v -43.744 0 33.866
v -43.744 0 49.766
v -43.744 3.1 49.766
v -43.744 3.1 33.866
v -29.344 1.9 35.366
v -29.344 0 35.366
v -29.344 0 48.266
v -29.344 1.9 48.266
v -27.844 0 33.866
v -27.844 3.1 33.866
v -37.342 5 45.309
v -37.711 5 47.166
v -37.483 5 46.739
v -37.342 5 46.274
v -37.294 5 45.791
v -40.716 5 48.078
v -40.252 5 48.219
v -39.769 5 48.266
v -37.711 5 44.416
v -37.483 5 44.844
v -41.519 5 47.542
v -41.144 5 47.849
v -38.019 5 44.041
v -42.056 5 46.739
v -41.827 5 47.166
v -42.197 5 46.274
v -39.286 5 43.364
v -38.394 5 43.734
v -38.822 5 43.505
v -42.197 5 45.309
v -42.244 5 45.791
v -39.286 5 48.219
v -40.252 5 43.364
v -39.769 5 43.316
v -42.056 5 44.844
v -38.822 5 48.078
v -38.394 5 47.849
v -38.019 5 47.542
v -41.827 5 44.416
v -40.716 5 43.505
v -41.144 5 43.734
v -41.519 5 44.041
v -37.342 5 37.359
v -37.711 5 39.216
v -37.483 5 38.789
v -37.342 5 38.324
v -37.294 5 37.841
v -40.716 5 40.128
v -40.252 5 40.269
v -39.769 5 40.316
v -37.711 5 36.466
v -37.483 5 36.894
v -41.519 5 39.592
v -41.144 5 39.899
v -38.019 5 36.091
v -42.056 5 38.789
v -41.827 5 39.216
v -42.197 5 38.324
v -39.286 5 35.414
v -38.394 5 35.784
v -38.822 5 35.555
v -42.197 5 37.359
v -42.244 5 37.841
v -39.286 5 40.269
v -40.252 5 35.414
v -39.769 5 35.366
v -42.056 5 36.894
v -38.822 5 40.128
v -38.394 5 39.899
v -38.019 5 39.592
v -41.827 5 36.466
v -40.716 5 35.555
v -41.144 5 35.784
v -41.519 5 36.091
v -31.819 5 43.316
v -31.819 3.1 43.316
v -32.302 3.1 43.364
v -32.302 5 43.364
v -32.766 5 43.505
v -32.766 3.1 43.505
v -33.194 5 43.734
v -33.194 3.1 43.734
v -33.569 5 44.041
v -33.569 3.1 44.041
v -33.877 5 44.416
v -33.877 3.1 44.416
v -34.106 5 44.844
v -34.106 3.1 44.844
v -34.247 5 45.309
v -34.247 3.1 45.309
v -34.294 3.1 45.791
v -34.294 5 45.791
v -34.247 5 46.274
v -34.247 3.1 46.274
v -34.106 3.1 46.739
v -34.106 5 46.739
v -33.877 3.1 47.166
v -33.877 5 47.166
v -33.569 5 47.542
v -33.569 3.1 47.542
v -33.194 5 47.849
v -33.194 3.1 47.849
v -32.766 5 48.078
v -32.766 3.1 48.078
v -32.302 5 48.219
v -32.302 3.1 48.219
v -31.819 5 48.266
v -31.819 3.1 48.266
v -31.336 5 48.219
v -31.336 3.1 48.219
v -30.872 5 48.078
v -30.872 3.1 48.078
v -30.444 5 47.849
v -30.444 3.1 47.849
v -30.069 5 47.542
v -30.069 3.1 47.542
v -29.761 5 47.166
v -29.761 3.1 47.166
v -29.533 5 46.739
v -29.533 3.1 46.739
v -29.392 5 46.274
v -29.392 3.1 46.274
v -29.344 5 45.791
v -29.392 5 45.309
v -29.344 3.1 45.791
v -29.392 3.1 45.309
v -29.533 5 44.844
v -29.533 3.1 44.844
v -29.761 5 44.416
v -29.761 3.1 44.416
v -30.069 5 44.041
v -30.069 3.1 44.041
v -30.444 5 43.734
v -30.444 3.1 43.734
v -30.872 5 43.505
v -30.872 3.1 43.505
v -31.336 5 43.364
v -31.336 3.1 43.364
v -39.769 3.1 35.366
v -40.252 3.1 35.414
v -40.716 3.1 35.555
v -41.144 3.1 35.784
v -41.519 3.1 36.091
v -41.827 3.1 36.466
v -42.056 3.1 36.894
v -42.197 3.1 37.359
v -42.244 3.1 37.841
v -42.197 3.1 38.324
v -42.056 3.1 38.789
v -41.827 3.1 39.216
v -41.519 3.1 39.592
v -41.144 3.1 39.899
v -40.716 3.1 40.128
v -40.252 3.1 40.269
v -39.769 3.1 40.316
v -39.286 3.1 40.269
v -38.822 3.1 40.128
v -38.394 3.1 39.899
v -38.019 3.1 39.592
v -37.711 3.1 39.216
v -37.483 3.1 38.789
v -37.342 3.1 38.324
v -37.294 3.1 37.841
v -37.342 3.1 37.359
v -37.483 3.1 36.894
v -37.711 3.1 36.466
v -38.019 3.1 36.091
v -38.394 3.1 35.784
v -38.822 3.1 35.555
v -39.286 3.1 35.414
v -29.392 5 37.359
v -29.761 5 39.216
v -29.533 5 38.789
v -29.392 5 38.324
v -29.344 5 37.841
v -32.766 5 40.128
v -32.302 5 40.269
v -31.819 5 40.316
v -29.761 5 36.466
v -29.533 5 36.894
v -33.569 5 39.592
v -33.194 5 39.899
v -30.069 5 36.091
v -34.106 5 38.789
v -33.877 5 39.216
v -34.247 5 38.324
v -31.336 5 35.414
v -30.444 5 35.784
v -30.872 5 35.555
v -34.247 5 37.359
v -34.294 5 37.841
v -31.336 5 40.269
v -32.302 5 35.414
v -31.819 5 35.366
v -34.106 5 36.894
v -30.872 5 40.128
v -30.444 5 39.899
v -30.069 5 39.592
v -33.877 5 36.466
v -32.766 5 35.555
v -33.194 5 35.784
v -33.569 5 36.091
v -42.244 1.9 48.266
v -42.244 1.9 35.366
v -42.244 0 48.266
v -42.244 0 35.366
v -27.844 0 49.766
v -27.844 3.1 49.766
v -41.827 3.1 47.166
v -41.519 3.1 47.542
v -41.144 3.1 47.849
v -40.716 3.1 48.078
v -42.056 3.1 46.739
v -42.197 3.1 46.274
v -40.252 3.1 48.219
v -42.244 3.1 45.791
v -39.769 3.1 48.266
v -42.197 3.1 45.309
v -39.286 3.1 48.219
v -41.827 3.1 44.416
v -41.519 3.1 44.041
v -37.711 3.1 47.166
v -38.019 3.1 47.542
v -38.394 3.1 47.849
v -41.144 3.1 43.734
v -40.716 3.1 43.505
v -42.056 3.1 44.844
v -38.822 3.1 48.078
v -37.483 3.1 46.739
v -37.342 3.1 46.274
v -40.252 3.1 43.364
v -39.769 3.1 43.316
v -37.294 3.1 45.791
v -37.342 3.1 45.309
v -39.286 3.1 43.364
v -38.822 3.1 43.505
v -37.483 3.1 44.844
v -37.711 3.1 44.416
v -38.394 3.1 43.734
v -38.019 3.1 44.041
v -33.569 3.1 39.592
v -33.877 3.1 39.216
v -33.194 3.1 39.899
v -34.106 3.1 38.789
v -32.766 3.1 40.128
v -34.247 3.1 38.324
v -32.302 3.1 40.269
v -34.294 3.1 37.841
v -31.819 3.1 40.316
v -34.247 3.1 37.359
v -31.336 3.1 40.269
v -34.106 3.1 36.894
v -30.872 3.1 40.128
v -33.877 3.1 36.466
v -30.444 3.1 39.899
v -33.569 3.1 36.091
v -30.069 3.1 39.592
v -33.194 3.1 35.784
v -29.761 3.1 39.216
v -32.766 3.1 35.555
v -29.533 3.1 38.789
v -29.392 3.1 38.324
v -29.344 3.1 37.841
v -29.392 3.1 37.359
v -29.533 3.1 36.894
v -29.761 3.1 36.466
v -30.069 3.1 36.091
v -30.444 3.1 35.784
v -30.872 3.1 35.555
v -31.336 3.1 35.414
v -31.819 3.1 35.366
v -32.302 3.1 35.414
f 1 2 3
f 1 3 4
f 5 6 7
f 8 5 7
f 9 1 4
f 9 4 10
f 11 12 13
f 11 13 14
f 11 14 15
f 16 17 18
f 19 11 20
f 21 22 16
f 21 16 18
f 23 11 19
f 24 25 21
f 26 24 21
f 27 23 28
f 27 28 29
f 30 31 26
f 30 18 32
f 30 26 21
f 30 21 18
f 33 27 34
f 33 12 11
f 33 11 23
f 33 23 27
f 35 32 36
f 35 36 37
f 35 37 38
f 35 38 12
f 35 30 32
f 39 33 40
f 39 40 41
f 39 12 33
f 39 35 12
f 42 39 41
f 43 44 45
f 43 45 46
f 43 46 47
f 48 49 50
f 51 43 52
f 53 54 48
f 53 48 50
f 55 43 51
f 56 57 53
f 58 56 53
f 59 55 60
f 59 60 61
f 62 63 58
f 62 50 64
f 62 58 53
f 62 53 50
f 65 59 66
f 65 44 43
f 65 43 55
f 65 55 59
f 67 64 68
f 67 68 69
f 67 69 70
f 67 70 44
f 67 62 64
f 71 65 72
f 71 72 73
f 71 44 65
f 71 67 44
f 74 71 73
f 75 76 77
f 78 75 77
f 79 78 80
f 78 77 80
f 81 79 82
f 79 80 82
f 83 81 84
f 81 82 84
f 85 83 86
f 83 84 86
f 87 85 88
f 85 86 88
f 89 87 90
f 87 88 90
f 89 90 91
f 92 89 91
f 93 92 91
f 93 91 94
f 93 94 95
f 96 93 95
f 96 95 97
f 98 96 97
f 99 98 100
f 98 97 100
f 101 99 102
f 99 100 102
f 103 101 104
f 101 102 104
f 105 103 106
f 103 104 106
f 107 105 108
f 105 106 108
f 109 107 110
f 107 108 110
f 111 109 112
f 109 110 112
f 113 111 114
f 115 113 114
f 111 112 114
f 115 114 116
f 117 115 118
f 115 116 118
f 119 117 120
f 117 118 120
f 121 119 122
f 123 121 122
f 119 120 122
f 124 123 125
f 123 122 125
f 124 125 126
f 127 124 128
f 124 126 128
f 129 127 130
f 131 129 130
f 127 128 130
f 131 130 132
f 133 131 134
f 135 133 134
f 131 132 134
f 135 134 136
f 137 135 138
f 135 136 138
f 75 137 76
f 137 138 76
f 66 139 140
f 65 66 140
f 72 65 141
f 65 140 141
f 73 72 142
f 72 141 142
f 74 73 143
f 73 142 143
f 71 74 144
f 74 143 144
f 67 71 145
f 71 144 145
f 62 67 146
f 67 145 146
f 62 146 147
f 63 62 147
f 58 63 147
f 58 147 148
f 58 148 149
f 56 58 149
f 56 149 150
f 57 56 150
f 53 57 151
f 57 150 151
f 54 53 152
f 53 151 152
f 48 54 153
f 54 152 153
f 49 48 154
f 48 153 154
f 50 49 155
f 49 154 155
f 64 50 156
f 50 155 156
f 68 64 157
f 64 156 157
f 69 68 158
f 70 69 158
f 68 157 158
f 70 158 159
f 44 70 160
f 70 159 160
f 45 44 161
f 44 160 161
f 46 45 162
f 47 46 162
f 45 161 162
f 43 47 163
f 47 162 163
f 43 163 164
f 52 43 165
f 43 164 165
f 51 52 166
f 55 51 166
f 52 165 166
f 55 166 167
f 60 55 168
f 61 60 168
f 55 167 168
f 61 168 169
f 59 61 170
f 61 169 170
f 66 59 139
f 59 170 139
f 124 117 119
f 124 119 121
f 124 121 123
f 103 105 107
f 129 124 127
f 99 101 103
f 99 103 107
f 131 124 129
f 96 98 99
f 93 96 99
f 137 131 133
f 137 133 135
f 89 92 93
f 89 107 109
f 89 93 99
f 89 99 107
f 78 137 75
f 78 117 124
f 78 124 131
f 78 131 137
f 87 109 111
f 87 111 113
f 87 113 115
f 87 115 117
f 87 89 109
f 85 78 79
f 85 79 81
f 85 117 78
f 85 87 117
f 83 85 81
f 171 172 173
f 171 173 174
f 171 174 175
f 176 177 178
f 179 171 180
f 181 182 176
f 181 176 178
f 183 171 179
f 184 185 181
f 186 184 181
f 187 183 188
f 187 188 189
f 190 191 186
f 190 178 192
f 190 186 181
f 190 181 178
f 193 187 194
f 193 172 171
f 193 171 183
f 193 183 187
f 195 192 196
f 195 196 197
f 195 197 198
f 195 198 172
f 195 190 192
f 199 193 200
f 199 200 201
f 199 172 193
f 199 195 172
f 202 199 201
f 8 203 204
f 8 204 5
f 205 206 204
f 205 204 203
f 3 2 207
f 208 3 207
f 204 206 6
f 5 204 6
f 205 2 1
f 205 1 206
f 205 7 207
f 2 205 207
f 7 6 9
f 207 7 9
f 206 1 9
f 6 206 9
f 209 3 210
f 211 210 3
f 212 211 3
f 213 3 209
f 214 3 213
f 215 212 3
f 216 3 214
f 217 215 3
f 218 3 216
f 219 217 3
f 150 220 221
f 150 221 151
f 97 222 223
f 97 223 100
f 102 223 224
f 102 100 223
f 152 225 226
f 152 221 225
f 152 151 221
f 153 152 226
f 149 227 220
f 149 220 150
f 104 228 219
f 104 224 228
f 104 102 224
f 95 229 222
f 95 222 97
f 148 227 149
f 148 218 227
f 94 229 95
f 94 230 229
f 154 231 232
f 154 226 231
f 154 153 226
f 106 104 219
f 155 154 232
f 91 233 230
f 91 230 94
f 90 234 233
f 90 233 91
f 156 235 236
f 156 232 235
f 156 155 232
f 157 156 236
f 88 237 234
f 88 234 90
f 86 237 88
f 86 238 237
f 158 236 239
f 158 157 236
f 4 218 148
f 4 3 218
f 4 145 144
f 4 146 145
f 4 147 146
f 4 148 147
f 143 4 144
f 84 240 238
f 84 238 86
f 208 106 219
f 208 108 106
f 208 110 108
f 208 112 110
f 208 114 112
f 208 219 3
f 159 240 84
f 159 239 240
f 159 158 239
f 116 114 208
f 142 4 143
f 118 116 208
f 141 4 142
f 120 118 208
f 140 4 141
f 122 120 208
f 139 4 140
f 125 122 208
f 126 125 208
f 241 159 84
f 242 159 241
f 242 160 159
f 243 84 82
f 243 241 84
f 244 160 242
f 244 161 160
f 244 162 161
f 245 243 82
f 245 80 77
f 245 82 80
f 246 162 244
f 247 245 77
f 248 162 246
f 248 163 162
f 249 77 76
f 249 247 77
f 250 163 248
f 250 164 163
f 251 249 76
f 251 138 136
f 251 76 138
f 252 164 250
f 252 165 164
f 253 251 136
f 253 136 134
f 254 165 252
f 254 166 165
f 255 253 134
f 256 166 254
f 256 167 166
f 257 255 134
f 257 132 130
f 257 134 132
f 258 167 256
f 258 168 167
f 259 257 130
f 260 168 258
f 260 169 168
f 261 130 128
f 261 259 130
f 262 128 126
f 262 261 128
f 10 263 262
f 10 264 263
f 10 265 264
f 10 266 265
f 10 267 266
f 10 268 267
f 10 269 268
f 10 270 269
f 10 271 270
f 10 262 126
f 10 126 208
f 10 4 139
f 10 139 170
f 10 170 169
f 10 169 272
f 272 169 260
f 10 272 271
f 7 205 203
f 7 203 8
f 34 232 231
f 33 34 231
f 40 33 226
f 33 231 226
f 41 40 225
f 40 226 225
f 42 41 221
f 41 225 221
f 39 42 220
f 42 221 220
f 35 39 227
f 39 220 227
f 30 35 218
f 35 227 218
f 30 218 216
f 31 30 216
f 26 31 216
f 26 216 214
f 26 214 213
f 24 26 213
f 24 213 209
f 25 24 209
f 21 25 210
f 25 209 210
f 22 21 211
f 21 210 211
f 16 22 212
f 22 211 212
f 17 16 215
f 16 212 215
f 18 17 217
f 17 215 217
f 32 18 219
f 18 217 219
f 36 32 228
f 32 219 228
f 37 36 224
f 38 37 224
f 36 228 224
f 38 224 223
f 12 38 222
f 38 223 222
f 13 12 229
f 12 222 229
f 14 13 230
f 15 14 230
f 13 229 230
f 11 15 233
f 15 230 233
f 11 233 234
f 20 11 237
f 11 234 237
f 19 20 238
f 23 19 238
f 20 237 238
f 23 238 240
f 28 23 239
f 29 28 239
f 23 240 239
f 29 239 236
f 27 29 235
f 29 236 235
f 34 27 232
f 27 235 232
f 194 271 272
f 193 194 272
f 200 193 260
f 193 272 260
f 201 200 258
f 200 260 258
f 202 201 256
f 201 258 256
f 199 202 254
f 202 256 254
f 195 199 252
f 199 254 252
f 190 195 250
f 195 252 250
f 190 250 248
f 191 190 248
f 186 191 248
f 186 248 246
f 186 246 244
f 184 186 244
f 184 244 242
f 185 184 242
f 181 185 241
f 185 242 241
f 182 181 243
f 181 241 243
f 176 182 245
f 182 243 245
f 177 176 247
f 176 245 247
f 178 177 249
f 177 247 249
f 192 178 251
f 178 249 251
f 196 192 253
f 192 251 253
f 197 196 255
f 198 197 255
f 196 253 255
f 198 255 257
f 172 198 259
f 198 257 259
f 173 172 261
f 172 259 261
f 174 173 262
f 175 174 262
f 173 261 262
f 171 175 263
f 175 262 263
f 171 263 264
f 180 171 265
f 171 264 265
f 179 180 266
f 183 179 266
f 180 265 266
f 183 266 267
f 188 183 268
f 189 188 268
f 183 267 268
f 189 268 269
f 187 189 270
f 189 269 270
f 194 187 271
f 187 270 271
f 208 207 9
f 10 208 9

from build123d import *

# Parameters (mm, degrees)
SKETCH1_W           = 15.9
SKETCH1_H           = 15.9
BOSS_EXTRUDE1_DEPTH = 3.1
SKETCH2_W           = 12.9
SKETCH2_H           = 12.9
CUT_EXTRUDE1_DEPTH  = 1.9
SKETCH3_R           = 2.475
BOSS_EXTRUDE2_DEPTH = 1.9


with BuildPart() as part:
    # Sketch1 → Boss-Extrude1 (new body)
    with BuildSketch(Plane(origin=(0, 0, 0), x_dir=(1, 0, 0), z_dir=(0, 1, 0))):
        with Locations((-35.79416664, -41.816451592)):
            Rectangle(SKETCH1_W, SKETCH1_H)
    extrude(amount=BOSS_EXTRUDE1_DEPTH)

    # Sketch2 → Cut-Extrude1 (cut)
    with BuildSketch(Plane.XZ):
        with Locations((-35.79416664, 41.816451592)):
            Rectangle(SKETCH2_W, SKETCH2_H)
    extrude(amount=-CUT_EXTRUDE1_DEPTH, mode=Mode.SUBTRACT)

    # Sketch3 → Boss-Extrude2 (add)
    with BuildSketch(Plane(origin=(0, 3.1, 0), x_dir=(1, 0, 0), z_dir=(0, 1, 0))):
        with Locations(Location((-39.76916664, -37.841451592, 0), (0, 0, 90))):
            Circle(SKETCH3_R)
        with Locations(Location((-31.81916664, -37.841451592, 0), (0, 0, 90))):
            Circle(SKETCH3_R)
        with Locations(Location((-39.76916664, -45.791451592, 0), (0, 0, 90))):
            Circle(SKETCH3_R)
        with Locations(Location((-31.81916664, -45.791451592, 0), (0, 0, 90))):
            Circle(SKETCH3_R)
    extrude(amount=BOSS_EXTRUDE2_DEPTH)


solid = part.part
